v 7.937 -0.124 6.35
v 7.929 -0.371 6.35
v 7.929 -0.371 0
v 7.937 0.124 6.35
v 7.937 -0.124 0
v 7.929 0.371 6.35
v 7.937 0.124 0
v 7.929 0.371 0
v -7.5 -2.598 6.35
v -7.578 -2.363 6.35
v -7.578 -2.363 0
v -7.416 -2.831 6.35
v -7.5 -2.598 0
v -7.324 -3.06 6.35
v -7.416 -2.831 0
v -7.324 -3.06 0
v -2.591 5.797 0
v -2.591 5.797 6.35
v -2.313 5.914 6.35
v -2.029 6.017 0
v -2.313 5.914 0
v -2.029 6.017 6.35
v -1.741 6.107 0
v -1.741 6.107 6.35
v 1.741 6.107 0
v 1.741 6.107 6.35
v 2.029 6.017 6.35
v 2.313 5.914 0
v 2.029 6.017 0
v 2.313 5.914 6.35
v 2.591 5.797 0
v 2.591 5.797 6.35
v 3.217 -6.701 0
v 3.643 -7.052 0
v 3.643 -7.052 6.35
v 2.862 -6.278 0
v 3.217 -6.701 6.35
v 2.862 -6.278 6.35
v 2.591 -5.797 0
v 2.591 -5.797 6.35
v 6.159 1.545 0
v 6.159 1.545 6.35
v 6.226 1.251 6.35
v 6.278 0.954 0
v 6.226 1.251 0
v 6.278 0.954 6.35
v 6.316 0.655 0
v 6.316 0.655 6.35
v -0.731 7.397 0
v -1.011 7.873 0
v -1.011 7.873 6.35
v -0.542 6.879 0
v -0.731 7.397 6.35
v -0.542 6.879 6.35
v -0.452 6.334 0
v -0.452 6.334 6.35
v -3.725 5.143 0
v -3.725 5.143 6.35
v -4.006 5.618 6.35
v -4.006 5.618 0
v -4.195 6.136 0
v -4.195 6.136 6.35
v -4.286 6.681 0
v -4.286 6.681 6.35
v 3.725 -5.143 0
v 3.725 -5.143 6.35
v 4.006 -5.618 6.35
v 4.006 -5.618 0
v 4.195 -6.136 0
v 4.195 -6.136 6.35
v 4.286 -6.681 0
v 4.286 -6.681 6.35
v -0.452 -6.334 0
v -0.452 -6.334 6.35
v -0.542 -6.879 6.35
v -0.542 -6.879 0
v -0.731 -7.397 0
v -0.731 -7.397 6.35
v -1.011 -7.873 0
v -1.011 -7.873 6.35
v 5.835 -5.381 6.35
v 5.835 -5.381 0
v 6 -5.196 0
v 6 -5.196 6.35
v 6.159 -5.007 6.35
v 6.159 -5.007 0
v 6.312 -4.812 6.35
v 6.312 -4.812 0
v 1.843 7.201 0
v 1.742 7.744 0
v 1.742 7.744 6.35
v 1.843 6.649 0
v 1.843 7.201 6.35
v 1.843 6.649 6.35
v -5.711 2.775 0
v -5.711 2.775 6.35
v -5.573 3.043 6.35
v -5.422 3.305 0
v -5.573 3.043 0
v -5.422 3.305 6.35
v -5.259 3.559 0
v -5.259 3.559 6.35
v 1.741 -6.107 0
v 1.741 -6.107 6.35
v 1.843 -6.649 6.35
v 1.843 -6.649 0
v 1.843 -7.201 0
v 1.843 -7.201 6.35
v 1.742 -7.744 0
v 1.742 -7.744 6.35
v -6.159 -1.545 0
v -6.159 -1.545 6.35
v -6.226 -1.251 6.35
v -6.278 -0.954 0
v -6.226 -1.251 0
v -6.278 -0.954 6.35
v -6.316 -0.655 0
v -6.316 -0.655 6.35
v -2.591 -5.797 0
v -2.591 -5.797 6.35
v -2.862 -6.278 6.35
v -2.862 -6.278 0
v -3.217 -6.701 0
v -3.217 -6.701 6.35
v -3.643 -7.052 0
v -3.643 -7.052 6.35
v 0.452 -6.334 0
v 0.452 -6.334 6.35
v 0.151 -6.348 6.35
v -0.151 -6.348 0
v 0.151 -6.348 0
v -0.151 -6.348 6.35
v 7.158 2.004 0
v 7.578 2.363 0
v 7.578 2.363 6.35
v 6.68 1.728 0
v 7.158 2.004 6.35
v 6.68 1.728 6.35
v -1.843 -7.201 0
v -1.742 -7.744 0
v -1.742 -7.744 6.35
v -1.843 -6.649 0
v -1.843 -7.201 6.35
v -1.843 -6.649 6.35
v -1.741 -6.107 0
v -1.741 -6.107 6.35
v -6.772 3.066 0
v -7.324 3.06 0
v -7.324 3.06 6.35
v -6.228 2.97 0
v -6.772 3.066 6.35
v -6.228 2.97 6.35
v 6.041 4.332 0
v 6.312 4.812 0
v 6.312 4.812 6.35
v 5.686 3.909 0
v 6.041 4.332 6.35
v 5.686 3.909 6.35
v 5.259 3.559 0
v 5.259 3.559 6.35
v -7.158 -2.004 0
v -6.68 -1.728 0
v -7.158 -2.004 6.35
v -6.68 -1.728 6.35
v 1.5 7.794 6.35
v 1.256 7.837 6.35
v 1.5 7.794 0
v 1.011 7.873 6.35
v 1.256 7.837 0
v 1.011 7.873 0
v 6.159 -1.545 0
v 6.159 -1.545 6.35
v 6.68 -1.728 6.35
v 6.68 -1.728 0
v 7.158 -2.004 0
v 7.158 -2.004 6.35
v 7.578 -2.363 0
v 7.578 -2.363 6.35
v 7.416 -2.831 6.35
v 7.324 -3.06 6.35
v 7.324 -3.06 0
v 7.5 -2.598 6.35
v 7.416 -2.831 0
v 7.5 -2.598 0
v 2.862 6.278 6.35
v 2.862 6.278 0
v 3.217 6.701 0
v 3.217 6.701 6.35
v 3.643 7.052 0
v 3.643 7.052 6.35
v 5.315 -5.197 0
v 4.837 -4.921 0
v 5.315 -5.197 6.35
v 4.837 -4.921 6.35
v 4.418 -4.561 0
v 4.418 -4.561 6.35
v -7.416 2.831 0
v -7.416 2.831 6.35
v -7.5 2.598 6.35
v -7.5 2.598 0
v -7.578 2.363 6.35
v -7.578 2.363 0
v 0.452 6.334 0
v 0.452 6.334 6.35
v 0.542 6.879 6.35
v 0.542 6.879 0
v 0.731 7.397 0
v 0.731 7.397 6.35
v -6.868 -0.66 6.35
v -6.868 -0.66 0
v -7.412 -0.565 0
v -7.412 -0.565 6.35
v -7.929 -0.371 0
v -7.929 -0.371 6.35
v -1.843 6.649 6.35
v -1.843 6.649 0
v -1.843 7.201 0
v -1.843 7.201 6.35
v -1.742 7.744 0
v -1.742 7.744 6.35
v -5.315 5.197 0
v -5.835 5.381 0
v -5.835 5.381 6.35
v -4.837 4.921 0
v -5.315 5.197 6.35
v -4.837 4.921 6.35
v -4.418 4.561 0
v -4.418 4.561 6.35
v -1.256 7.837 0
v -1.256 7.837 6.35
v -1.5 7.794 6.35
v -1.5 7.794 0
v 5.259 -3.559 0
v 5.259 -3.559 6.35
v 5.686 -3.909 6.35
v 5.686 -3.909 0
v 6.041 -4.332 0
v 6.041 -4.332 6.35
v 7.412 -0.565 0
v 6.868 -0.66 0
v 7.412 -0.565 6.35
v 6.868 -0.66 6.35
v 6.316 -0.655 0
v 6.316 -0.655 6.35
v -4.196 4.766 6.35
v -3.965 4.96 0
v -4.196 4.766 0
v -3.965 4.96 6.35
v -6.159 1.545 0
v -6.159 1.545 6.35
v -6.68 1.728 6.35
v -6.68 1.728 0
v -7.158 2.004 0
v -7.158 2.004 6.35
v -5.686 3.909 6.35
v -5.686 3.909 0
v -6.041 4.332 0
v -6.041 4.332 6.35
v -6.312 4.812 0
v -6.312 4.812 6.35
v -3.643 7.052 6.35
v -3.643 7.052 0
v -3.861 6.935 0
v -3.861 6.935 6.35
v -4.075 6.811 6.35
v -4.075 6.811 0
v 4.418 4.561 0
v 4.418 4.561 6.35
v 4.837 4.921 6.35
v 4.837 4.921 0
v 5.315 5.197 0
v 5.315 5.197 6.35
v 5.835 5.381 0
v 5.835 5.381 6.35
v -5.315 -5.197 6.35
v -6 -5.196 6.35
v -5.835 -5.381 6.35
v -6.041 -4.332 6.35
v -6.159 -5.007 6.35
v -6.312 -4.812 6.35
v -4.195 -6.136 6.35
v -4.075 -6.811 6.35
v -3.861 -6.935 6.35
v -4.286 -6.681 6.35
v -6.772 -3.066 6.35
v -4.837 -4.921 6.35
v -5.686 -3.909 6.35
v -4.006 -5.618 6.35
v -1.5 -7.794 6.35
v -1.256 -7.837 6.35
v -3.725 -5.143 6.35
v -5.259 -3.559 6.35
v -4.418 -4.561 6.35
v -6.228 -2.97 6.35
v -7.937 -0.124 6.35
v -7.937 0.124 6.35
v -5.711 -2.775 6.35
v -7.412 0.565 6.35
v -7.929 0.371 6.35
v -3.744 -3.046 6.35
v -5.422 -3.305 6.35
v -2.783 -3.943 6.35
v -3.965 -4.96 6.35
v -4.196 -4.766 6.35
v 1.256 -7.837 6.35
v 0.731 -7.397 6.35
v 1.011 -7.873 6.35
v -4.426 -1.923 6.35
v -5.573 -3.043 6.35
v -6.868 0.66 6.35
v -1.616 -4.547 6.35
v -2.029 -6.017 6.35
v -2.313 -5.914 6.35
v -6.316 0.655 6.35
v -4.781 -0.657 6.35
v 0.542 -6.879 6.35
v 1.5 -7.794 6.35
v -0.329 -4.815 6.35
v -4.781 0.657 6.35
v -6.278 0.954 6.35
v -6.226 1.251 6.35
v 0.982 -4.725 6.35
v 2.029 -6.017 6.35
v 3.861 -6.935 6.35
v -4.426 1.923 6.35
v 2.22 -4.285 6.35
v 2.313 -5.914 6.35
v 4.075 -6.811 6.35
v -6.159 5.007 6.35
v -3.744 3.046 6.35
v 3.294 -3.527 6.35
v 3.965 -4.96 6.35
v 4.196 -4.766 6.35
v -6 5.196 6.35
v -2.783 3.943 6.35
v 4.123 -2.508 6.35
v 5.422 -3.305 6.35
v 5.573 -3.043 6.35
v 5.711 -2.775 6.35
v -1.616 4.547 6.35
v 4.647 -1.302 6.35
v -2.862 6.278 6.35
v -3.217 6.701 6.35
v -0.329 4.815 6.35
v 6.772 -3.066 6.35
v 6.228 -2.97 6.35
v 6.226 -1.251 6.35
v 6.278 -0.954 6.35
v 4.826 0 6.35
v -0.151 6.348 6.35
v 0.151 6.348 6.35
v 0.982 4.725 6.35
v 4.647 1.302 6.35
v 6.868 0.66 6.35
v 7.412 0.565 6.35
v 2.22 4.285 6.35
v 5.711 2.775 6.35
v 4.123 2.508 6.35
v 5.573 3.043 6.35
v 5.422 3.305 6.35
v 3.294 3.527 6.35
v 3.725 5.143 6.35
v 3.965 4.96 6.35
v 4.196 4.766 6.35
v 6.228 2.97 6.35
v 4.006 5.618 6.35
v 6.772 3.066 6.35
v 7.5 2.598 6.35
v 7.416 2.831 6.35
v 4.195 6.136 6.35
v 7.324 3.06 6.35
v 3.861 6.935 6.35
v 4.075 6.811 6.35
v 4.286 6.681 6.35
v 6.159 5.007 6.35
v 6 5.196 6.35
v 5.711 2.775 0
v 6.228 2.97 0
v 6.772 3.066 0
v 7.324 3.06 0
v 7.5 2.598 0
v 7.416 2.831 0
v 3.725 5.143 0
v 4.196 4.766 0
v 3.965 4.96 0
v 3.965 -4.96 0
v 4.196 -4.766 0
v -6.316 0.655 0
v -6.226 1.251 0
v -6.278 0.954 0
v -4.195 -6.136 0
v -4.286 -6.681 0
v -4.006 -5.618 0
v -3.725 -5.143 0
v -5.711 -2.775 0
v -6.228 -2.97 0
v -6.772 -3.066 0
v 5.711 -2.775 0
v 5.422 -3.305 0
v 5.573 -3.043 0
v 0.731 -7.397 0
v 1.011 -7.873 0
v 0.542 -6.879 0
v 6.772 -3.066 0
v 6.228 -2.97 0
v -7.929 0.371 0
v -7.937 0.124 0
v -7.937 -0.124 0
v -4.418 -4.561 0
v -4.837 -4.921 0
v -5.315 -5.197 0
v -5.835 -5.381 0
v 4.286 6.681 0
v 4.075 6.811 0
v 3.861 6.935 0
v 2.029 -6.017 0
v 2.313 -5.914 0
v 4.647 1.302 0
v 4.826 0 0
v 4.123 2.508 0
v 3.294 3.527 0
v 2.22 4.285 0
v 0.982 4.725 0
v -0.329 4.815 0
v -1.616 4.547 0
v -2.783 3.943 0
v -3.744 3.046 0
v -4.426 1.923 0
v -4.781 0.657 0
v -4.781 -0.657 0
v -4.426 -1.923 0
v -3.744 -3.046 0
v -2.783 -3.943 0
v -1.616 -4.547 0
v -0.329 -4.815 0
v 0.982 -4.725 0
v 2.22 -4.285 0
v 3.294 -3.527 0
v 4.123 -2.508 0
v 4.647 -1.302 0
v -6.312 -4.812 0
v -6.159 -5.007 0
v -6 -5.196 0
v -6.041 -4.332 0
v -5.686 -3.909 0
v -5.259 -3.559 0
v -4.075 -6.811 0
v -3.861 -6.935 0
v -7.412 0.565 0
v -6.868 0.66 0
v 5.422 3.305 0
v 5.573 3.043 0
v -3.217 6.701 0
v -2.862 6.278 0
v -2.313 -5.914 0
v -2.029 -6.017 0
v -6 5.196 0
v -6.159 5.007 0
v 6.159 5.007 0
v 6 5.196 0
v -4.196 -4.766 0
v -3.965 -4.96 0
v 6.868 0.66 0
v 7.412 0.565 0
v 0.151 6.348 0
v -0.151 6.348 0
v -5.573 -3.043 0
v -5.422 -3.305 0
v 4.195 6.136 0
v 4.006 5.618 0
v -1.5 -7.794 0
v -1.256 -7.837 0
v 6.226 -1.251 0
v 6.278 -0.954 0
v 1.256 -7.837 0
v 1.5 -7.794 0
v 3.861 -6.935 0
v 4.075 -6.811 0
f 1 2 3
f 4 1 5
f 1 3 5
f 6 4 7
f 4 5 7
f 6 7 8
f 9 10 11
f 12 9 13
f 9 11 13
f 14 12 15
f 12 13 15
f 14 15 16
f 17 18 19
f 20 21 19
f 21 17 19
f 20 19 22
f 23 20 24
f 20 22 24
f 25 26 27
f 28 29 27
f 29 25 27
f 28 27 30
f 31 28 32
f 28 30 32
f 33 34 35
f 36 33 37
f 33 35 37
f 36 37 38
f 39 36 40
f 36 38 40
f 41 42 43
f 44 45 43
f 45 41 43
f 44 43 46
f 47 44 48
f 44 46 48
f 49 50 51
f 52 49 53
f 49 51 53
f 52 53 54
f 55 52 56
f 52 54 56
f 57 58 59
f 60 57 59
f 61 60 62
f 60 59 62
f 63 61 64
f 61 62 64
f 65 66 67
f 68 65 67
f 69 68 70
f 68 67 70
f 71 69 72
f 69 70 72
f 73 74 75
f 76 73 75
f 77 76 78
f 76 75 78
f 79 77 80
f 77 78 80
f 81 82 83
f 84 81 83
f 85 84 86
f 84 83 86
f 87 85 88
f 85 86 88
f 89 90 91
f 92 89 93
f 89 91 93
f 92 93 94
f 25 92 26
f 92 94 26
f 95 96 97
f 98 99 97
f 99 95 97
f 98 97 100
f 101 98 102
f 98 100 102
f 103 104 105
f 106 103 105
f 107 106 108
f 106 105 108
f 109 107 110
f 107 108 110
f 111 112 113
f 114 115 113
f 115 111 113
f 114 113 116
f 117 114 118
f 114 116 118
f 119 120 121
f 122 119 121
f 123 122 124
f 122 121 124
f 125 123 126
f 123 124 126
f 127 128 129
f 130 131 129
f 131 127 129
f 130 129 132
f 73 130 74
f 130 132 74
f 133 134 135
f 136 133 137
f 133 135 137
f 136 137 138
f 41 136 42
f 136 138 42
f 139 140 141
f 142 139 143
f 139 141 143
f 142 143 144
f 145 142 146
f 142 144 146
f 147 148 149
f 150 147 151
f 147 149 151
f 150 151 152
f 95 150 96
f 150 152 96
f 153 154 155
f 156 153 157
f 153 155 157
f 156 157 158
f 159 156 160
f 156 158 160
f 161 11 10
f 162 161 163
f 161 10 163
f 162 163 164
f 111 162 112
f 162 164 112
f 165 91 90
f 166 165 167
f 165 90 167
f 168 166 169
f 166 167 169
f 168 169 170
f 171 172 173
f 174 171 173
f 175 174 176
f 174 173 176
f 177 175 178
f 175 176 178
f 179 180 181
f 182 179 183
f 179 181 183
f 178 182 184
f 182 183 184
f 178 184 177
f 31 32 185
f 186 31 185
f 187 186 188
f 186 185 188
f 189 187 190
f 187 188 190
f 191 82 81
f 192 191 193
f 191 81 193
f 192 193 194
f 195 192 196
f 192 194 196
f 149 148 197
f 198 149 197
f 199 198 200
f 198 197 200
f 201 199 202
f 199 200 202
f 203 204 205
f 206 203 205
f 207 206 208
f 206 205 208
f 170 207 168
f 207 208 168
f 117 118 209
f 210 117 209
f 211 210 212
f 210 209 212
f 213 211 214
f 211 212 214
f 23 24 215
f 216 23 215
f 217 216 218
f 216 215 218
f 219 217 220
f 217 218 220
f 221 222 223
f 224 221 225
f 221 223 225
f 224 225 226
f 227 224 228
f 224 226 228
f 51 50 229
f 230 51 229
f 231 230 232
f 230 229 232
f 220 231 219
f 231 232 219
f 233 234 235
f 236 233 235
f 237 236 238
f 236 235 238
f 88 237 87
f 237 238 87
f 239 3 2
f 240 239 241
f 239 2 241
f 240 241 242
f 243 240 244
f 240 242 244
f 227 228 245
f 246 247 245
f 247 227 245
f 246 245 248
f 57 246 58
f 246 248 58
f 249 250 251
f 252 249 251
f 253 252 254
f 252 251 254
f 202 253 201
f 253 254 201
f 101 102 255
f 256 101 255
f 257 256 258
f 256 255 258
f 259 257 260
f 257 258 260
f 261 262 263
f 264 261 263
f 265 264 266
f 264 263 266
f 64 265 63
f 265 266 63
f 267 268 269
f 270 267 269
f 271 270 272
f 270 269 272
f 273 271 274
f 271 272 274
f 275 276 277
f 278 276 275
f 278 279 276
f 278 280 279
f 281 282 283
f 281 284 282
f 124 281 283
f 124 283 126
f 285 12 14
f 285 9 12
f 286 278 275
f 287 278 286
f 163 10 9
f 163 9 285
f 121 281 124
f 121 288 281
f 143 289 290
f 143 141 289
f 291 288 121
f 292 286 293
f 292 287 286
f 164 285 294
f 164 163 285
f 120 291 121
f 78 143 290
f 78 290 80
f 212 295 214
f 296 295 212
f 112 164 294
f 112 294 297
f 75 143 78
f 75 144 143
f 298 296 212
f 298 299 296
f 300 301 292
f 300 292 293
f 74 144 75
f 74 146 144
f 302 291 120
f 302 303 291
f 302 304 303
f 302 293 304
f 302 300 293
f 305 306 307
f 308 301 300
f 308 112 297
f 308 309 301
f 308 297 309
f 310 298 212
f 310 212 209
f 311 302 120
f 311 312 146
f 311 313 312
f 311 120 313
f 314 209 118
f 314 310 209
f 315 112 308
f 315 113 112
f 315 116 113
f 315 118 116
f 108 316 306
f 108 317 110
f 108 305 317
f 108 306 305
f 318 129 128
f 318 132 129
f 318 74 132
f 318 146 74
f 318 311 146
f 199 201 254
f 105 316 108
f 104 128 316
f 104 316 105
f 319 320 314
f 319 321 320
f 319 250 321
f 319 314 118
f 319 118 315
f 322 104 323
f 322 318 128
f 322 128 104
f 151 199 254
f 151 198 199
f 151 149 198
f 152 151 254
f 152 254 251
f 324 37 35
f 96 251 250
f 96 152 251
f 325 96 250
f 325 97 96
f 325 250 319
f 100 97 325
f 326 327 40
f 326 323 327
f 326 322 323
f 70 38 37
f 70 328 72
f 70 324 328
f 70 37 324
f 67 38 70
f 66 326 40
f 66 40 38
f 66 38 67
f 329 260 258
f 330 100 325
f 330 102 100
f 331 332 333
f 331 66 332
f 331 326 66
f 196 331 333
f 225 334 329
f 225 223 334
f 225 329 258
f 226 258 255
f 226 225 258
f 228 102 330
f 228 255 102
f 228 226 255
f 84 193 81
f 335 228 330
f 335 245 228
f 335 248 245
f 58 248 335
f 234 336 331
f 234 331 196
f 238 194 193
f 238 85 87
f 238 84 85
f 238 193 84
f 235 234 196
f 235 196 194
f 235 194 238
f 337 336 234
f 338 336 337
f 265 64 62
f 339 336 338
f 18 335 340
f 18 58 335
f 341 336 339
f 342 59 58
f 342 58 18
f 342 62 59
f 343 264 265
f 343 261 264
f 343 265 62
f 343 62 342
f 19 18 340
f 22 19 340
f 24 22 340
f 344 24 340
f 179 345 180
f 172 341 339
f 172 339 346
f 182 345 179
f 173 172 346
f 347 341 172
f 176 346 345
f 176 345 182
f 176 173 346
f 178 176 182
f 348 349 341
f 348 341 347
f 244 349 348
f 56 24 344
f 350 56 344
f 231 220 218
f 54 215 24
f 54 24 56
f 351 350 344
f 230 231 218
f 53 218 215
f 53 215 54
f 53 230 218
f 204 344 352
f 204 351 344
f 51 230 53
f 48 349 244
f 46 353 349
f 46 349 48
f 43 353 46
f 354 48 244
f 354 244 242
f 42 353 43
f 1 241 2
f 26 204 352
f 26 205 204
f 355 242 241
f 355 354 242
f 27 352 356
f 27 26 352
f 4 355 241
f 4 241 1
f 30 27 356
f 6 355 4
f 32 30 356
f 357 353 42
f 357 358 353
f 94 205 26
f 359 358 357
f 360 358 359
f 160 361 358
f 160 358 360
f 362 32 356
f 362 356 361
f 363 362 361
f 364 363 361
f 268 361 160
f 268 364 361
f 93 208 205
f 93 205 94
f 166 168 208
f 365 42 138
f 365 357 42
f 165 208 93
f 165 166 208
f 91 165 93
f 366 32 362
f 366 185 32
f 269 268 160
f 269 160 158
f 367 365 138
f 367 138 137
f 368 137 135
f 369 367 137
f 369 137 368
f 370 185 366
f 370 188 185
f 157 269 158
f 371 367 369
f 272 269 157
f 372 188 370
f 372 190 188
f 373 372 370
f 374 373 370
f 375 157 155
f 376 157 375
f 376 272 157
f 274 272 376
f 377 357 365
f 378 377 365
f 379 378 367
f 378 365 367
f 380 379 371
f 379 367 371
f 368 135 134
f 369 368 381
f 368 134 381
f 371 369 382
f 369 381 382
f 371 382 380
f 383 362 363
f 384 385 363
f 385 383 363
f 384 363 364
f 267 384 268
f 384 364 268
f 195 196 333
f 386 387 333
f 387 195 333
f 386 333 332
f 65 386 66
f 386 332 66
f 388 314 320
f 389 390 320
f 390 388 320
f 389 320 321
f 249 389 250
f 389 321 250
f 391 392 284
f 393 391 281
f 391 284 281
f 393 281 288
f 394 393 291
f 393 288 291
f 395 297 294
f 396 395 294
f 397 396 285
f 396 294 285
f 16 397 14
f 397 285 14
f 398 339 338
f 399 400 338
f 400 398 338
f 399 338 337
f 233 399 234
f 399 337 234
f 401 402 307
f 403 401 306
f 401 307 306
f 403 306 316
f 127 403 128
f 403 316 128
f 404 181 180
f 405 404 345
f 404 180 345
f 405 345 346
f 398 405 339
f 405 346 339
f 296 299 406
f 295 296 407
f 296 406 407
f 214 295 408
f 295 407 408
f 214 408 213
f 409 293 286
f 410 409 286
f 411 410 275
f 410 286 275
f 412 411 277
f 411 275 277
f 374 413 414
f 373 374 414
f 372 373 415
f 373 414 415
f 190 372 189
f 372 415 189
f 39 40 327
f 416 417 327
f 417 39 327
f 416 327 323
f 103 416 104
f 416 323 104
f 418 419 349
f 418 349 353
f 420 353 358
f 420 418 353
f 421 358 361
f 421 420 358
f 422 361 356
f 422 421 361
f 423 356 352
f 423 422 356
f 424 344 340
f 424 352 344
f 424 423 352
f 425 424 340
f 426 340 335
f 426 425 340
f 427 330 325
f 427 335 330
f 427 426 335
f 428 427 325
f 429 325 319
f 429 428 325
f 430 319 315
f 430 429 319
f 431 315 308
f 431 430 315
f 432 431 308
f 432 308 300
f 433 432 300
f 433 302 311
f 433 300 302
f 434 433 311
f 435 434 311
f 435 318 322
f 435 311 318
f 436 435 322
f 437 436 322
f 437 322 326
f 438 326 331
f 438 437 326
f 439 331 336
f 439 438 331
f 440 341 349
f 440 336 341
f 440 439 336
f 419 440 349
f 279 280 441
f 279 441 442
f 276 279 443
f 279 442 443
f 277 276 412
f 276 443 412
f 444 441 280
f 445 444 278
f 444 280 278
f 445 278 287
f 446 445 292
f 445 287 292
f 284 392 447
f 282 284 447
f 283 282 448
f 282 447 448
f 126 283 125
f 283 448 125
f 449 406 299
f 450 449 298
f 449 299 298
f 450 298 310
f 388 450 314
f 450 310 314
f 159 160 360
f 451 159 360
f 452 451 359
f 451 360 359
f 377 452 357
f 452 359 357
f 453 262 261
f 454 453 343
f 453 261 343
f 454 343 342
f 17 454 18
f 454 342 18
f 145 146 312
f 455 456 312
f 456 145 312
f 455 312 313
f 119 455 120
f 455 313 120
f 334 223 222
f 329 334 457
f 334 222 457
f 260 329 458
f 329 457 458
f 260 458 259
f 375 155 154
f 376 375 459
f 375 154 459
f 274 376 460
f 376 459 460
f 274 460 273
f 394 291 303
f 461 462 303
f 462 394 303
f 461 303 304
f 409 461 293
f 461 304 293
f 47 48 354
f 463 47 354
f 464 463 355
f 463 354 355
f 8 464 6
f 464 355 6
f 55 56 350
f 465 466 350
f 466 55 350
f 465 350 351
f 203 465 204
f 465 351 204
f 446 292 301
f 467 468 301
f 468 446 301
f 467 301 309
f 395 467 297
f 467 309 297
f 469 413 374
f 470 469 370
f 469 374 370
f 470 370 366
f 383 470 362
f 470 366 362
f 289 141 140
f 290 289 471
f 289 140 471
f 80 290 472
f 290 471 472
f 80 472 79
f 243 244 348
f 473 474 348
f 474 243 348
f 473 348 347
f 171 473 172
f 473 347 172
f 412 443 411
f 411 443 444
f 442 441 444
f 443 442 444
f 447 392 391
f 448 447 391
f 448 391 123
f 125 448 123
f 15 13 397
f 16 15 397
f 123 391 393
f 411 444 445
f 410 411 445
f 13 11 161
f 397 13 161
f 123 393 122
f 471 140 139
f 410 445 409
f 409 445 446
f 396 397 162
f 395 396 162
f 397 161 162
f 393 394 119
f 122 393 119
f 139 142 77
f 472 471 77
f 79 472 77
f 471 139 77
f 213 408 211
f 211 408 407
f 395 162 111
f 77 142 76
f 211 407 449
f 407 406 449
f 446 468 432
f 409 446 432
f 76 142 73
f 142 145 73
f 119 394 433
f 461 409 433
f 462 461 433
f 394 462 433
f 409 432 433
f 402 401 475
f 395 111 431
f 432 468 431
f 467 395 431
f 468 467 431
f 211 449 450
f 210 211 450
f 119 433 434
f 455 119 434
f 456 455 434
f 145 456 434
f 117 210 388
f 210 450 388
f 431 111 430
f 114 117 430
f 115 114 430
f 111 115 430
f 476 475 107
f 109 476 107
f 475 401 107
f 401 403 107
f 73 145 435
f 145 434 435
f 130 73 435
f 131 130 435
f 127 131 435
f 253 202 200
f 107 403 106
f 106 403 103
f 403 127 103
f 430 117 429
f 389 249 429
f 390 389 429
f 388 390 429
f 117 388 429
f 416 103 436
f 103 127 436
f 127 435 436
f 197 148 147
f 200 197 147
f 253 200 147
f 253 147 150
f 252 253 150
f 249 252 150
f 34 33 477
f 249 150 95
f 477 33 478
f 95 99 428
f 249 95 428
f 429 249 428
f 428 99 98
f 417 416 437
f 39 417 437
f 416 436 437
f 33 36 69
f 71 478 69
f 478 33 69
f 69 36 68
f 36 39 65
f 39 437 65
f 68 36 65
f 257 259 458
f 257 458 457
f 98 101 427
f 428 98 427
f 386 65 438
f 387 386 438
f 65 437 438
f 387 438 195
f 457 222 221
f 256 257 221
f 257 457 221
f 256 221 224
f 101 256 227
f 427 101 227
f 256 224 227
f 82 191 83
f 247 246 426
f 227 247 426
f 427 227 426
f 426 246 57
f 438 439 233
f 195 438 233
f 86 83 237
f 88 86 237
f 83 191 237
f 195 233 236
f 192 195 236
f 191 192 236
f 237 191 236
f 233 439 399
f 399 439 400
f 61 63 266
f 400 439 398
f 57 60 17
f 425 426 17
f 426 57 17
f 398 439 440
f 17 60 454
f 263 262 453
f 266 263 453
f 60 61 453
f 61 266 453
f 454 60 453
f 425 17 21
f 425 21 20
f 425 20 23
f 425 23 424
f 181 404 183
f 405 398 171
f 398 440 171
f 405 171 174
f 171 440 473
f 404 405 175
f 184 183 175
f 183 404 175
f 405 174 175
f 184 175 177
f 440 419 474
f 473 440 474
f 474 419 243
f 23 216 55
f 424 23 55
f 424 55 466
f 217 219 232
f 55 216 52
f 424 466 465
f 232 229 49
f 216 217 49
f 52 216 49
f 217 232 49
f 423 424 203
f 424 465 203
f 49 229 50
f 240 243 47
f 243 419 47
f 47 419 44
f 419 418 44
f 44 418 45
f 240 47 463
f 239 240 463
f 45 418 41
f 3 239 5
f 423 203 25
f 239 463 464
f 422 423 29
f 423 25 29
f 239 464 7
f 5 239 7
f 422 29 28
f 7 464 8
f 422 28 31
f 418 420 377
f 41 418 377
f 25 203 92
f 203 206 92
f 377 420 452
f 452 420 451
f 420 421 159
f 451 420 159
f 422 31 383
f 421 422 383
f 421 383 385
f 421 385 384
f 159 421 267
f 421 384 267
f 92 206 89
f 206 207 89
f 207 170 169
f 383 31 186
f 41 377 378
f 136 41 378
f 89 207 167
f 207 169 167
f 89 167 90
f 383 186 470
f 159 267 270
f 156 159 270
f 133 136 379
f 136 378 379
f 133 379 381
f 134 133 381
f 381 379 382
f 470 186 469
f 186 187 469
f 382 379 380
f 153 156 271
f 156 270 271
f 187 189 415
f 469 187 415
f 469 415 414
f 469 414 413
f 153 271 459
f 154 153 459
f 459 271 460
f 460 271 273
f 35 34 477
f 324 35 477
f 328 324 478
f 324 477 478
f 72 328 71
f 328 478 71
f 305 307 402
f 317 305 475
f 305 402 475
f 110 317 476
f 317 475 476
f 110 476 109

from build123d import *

# Parameters (mm, degrees)
SKETCH1_R               = 7.9375
OUTER_CIRCLE_DEPTH      = 6.35
TOOTH_CUT_DEPTH         = 13.896910967
TEETH_PATTERN_COUNT     = 18
CUT_EXTRUDE1_DEPTH      = 12.621761341
CUT_EXTRUDE1_DEPTH_BACK = 12.621761341
PITCH_DIAMETER_R        = 4.826


with BuildPart() as part:
    # Sketch1 → Outer Circle (new body)
    with BuildSketch(Plane.XY):
        Circle(SKETCH1_R)
    extrude(amount=OUTER_CIRCLE_DEPTH)

    # Sketch2 → Tooth Cut (cut, through all)
    with BuildSketch(Plane.XY.offset(6.35)):
        with BuildLine():
            ThreePointArc((-0.452232993, 6.333876011), (0, 6.35), (0.452232993, 6.333876011))
            ThreePointArc((0.452232993, 6.333876011), (0.624488533, 7.142351531), (1.011484471, 7.872788922))
            ThreePointArc((1.011484471, 7.872788922), (0, 7.9375), (-1.011484471, 7.872788922))
            ThreePointArc((-1.011484471, 7.872788922), (-0.624488533, 7.142351531), (-0.452232993, 6.333876011))
        make_face()
    tooth_cut = extrude(amount=-TOOTH_CUT_DEPTH, mode=Mode.SUBTRACT)

    # Teeth Pattern: Tooth Cut ×18 about axis
    teeth_pattern_axis = Axis((0, 0, 0), (0, 0, 1))
    for i in range(1, TEETH_PATTERN_COUNT):
        add(tooth_cut.rotate(teeth_pattern_axis, i * 360 / TEETH_PATTERN_COUNT), mode=Mode.SUBTRACT)

    # Pitch Diameter → Cut-Extrude1 (cut, two sides: drawn at the far end of the back side and taken through both)
    with BuildSketch(Plane.XY.offset(3.175).offset(-CUT_EXTRUDE1_DEPTH_BACK)):
        Circle(PITCH_DIAMETER_R)
    extrude(amount=CUT_EXTRUDE1_DEPTH + CUT_EXTRUDE1_DEPTH_BACK, mode=Mode.SUBTRACT)


solid = part.part
